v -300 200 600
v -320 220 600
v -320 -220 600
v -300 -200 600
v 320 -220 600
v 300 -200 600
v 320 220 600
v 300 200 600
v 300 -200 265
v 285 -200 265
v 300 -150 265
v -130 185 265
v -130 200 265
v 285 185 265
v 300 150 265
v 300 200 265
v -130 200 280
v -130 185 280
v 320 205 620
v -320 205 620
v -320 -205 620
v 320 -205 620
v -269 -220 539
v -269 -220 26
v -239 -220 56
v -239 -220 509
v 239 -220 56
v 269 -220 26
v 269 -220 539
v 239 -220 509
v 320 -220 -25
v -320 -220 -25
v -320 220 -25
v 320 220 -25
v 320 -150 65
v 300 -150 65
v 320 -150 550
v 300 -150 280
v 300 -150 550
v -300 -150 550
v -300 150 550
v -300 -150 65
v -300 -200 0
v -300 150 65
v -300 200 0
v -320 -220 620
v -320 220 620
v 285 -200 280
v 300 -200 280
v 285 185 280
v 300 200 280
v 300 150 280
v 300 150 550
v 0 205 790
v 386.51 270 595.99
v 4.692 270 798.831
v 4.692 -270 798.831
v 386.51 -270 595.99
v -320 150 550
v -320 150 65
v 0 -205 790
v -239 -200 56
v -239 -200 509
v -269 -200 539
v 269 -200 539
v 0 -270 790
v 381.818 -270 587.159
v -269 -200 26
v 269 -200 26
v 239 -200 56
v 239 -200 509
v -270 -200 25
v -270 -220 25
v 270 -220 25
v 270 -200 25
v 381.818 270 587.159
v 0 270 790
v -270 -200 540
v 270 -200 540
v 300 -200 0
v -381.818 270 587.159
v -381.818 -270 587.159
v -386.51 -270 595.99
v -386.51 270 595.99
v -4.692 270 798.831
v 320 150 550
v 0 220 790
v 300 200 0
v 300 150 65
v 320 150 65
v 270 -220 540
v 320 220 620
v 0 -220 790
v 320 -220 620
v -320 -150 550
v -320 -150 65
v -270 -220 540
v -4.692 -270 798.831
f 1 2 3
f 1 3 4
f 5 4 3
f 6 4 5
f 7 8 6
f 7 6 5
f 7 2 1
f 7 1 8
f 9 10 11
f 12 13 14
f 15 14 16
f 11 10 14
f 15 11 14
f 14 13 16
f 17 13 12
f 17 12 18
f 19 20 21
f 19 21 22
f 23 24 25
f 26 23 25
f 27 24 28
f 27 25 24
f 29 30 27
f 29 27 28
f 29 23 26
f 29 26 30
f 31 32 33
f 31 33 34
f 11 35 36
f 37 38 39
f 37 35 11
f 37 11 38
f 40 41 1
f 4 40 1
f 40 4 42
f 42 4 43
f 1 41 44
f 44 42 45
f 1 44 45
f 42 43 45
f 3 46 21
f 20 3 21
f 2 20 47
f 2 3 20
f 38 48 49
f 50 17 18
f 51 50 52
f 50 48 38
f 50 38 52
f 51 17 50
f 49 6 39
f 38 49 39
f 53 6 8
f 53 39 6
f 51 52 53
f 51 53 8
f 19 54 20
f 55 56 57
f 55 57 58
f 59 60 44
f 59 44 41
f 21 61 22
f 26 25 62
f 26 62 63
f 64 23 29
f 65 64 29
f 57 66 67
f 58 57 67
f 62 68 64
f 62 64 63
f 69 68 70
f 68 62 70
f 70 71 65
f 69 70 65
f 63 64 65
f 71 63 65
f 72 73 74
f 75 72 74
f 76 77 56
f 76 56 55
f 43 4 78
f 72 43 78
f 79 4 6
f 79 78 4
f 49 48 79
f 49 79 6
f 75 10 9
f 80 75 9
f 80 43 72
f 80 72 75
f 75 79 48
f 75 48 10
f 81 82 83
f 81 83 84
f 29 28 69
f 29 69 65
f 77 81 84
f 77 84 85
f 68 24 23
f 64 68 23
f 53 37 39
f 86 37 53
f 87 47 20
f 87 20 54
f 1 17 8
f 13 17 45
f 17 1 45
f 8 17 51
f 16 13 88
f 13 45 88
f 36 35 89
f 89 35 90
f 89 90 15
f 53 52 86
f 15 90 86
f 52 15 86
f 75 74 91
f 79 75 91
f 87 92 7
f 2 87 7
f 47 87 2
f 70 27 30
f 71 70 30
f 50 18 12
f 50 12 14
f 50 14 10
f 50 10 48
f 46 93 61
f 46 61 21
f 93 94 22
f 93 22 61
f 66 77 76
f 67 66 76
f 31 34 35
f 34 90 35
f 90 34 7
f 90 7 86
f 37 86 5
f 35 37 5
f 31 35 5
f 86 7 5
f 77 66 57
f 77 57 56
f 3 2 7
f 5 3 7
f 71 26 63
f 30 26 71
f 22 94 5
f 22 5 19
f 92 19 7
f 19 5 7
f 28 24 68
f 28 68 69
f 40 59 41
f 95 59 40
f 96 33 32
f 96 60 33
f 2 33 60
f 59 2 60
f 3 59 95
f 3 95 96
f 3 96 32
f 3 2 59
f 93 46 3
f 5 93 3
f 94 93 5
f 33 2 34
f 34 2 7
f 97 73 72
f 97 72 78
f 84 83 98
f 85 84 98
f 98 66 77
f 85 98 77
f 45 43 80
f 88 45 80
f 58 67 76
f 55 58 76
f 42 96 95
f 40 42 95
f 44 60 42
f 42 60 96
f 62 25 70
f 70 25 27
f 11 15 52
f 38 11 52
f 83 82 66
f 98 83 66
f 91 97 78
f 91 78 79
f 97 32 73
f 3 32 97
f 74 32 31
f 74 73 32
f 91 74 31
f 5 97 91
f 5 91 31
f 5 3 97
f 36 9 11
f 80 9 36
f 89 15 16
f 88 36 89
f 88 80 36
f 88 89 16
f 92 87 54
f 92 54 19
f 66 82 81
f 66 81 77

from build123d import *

# Parameters (mm, degrees)
F0_W      = 640
F0_H      = 440
F0_W_2    = 600
F0_H_2    = 400
F1_DEPTH  = 600
F2_W      = 640
F2_H      = 440
F3_DEPTH  = 20
F4_W      = 300
F4_H      = 485
F5_DEPTH  = 20
F6_W      = 540
F6_H      = 515
F7_DEPTH  = 20
F8_W      = 300
F8_H      = 485
F9_DEPTH  = 640.001
F10_W     = 640
F10_H     = 440
F11_DEPTH = 25
F13_W     = 15
F13_H     = 15
F14_DEPTH = 400
F15_W     = 415
F15_H     = 15
F16_DEPTH = 15
F18_DEPTH = 15
F20_DEPTH = 15
F21_W     = 432.3534186399
F21_H     = 540
F23_DEPTH = 10
F22_W     = 432.3534186399
F22_H     = 540
F24_DEPTH = 10
F25_W     = 538
F25_H     = 513
F25_W_2   = 478
F25_H_2   = 453
F26_DEPTH = 20


with BuildPart() as f1:
    # F0 (on Top) → F1 (new body)
    with BuildSketch(Plane.XY):
        Rectangle(F0_W, F0_H)
        Rectangle(F0_W_2, F0_H_2, mode=Mode.SUBTRACT)
    extrude(amount=F1_DEPTH)

    # F4 (on face) → F5 (cut)
    with BuildSketch(Plane.YZ.offset(320)):
        with Locations((0, 307.5)):
            Rectangle(F4_W, F4_H)
    extrude(amount=-F5_DEPTH, mode=Mode.SUBTRACT)

    # F6 (on face) → F7 (cut)
    with BuildSketch(Plane.XZ.offset(220)):
        with Locations((0, 282.5)):
            Rectangle(F6_W, F6_H)
    extrude(amount=-F7_DEPTH, mode=Mode.SUBTRACT)

    # F8 (on face) → F9 (cut, through all)
    with BuildSketch(Plane(origin=(-320, 0, 0), x_dir=(0, -1, 0), z_dir=(-1, 0, 0))):
        with Locations((0, 307.5)):
            Rectangle(F8_W, F8_H)
    extrude(amount=-F9_DEPTH, mode=Mode.SUBTRACT)

    # F10 (on face) → F11 (join)
    with BuildSketch(Plane(origin=(0, 0, 0), x_dir=(1, 0, 0), z_dir=(0, 0, -1))):
        Rectangle(F10_W, F10_H)
    extrude(amount=F11_DEPTH)

    # F13 (on face) → F14 (join, through all)
    with BuildSketch(Plane.XZ.offset(-200)):
        with Locations((292.5, 272.5)):
            Rectangle(F13_W, F13_H)
    extrude(amount=F14_DEPTH)

    # F15 (on face) → F16 (join)
    with BuildSketch(Plane.XZ.offset(-200)):
        with Locations((77.5, 272.5)):
            Rectangle(F15_W, F15_H)
    extrude(amount=F16_DEPTH)


with BuildPart() as f3:
    # F2 (on face) → F3 (new body)
    with BuildSketch(Plane.XY.offset(600)):
        Rectangle(F2_W, F2_H)
    extrude(amount=F3_DEPTH)

    # F17 (on face) → F18 (join)
    with BuildSketch(Plane.XZ.offset(220)):
        Polygon((0, 790), (-320, 620), (320, 620), align=None)
    extrude(amount=-F18_DEPTH)

    # F19 (on face) → F20 (join)
    with BuildSketch(Plane(origin=(0, 220, 0), x_dir=(-1, 0, 0), z_dir=(0, 1, 0))):
        Polygon((0, 790), (-320, 620), (320, 620), align=None)
    extrude(amount=-F20_DEPTH)


with BuildPart() as f23:
    # F21 (on face) → F23 (new body)
    with BuildSketch(Plane(origin=(-327.3115003808, 0, 616.1157654227), x_dir=(0.8831157195, 0, 0.469155226), z_dir=(-0.469155226, 0, 0.8831157195))):
        with Locations((154.4559191898, 0)):
            Rectangle(F21_W, F21_H)
    extrude(amount=F23_DEPTH)


with BuildPart() as f24:
    # F22 (on face) → F24 (new body)
    with BuildSketch(Plane(origin=(327.3115003808, 0, 616.1157654227), x_dir=(0.8831157195, 0, -0.469155226), z_dir=(0.469155226, 0, 0.8831157195))):
        with Locations((-154.4559191898, 0)):
            Rectangle(F22_W, F22_H)
    extrude(amount=F24_DEPTH)


with BuildPart() as f26:
    # F25 (on face) → F26 (new body)
    with BuildSketch(Plane.XZ.offset(220)):
        with Locations((0, 282.5)):
            Rectangle(F25_W, F25_H)
        with Locations((0, 282.5)):
            Rectangle(F25_W_2, F25_H_2, mode=Mode.SUBTRACT)
    extrude(amount=-F26_DEPTH)


solid = Compound([f1.part, f3.part, f23.part, f24.part, f26.part])
